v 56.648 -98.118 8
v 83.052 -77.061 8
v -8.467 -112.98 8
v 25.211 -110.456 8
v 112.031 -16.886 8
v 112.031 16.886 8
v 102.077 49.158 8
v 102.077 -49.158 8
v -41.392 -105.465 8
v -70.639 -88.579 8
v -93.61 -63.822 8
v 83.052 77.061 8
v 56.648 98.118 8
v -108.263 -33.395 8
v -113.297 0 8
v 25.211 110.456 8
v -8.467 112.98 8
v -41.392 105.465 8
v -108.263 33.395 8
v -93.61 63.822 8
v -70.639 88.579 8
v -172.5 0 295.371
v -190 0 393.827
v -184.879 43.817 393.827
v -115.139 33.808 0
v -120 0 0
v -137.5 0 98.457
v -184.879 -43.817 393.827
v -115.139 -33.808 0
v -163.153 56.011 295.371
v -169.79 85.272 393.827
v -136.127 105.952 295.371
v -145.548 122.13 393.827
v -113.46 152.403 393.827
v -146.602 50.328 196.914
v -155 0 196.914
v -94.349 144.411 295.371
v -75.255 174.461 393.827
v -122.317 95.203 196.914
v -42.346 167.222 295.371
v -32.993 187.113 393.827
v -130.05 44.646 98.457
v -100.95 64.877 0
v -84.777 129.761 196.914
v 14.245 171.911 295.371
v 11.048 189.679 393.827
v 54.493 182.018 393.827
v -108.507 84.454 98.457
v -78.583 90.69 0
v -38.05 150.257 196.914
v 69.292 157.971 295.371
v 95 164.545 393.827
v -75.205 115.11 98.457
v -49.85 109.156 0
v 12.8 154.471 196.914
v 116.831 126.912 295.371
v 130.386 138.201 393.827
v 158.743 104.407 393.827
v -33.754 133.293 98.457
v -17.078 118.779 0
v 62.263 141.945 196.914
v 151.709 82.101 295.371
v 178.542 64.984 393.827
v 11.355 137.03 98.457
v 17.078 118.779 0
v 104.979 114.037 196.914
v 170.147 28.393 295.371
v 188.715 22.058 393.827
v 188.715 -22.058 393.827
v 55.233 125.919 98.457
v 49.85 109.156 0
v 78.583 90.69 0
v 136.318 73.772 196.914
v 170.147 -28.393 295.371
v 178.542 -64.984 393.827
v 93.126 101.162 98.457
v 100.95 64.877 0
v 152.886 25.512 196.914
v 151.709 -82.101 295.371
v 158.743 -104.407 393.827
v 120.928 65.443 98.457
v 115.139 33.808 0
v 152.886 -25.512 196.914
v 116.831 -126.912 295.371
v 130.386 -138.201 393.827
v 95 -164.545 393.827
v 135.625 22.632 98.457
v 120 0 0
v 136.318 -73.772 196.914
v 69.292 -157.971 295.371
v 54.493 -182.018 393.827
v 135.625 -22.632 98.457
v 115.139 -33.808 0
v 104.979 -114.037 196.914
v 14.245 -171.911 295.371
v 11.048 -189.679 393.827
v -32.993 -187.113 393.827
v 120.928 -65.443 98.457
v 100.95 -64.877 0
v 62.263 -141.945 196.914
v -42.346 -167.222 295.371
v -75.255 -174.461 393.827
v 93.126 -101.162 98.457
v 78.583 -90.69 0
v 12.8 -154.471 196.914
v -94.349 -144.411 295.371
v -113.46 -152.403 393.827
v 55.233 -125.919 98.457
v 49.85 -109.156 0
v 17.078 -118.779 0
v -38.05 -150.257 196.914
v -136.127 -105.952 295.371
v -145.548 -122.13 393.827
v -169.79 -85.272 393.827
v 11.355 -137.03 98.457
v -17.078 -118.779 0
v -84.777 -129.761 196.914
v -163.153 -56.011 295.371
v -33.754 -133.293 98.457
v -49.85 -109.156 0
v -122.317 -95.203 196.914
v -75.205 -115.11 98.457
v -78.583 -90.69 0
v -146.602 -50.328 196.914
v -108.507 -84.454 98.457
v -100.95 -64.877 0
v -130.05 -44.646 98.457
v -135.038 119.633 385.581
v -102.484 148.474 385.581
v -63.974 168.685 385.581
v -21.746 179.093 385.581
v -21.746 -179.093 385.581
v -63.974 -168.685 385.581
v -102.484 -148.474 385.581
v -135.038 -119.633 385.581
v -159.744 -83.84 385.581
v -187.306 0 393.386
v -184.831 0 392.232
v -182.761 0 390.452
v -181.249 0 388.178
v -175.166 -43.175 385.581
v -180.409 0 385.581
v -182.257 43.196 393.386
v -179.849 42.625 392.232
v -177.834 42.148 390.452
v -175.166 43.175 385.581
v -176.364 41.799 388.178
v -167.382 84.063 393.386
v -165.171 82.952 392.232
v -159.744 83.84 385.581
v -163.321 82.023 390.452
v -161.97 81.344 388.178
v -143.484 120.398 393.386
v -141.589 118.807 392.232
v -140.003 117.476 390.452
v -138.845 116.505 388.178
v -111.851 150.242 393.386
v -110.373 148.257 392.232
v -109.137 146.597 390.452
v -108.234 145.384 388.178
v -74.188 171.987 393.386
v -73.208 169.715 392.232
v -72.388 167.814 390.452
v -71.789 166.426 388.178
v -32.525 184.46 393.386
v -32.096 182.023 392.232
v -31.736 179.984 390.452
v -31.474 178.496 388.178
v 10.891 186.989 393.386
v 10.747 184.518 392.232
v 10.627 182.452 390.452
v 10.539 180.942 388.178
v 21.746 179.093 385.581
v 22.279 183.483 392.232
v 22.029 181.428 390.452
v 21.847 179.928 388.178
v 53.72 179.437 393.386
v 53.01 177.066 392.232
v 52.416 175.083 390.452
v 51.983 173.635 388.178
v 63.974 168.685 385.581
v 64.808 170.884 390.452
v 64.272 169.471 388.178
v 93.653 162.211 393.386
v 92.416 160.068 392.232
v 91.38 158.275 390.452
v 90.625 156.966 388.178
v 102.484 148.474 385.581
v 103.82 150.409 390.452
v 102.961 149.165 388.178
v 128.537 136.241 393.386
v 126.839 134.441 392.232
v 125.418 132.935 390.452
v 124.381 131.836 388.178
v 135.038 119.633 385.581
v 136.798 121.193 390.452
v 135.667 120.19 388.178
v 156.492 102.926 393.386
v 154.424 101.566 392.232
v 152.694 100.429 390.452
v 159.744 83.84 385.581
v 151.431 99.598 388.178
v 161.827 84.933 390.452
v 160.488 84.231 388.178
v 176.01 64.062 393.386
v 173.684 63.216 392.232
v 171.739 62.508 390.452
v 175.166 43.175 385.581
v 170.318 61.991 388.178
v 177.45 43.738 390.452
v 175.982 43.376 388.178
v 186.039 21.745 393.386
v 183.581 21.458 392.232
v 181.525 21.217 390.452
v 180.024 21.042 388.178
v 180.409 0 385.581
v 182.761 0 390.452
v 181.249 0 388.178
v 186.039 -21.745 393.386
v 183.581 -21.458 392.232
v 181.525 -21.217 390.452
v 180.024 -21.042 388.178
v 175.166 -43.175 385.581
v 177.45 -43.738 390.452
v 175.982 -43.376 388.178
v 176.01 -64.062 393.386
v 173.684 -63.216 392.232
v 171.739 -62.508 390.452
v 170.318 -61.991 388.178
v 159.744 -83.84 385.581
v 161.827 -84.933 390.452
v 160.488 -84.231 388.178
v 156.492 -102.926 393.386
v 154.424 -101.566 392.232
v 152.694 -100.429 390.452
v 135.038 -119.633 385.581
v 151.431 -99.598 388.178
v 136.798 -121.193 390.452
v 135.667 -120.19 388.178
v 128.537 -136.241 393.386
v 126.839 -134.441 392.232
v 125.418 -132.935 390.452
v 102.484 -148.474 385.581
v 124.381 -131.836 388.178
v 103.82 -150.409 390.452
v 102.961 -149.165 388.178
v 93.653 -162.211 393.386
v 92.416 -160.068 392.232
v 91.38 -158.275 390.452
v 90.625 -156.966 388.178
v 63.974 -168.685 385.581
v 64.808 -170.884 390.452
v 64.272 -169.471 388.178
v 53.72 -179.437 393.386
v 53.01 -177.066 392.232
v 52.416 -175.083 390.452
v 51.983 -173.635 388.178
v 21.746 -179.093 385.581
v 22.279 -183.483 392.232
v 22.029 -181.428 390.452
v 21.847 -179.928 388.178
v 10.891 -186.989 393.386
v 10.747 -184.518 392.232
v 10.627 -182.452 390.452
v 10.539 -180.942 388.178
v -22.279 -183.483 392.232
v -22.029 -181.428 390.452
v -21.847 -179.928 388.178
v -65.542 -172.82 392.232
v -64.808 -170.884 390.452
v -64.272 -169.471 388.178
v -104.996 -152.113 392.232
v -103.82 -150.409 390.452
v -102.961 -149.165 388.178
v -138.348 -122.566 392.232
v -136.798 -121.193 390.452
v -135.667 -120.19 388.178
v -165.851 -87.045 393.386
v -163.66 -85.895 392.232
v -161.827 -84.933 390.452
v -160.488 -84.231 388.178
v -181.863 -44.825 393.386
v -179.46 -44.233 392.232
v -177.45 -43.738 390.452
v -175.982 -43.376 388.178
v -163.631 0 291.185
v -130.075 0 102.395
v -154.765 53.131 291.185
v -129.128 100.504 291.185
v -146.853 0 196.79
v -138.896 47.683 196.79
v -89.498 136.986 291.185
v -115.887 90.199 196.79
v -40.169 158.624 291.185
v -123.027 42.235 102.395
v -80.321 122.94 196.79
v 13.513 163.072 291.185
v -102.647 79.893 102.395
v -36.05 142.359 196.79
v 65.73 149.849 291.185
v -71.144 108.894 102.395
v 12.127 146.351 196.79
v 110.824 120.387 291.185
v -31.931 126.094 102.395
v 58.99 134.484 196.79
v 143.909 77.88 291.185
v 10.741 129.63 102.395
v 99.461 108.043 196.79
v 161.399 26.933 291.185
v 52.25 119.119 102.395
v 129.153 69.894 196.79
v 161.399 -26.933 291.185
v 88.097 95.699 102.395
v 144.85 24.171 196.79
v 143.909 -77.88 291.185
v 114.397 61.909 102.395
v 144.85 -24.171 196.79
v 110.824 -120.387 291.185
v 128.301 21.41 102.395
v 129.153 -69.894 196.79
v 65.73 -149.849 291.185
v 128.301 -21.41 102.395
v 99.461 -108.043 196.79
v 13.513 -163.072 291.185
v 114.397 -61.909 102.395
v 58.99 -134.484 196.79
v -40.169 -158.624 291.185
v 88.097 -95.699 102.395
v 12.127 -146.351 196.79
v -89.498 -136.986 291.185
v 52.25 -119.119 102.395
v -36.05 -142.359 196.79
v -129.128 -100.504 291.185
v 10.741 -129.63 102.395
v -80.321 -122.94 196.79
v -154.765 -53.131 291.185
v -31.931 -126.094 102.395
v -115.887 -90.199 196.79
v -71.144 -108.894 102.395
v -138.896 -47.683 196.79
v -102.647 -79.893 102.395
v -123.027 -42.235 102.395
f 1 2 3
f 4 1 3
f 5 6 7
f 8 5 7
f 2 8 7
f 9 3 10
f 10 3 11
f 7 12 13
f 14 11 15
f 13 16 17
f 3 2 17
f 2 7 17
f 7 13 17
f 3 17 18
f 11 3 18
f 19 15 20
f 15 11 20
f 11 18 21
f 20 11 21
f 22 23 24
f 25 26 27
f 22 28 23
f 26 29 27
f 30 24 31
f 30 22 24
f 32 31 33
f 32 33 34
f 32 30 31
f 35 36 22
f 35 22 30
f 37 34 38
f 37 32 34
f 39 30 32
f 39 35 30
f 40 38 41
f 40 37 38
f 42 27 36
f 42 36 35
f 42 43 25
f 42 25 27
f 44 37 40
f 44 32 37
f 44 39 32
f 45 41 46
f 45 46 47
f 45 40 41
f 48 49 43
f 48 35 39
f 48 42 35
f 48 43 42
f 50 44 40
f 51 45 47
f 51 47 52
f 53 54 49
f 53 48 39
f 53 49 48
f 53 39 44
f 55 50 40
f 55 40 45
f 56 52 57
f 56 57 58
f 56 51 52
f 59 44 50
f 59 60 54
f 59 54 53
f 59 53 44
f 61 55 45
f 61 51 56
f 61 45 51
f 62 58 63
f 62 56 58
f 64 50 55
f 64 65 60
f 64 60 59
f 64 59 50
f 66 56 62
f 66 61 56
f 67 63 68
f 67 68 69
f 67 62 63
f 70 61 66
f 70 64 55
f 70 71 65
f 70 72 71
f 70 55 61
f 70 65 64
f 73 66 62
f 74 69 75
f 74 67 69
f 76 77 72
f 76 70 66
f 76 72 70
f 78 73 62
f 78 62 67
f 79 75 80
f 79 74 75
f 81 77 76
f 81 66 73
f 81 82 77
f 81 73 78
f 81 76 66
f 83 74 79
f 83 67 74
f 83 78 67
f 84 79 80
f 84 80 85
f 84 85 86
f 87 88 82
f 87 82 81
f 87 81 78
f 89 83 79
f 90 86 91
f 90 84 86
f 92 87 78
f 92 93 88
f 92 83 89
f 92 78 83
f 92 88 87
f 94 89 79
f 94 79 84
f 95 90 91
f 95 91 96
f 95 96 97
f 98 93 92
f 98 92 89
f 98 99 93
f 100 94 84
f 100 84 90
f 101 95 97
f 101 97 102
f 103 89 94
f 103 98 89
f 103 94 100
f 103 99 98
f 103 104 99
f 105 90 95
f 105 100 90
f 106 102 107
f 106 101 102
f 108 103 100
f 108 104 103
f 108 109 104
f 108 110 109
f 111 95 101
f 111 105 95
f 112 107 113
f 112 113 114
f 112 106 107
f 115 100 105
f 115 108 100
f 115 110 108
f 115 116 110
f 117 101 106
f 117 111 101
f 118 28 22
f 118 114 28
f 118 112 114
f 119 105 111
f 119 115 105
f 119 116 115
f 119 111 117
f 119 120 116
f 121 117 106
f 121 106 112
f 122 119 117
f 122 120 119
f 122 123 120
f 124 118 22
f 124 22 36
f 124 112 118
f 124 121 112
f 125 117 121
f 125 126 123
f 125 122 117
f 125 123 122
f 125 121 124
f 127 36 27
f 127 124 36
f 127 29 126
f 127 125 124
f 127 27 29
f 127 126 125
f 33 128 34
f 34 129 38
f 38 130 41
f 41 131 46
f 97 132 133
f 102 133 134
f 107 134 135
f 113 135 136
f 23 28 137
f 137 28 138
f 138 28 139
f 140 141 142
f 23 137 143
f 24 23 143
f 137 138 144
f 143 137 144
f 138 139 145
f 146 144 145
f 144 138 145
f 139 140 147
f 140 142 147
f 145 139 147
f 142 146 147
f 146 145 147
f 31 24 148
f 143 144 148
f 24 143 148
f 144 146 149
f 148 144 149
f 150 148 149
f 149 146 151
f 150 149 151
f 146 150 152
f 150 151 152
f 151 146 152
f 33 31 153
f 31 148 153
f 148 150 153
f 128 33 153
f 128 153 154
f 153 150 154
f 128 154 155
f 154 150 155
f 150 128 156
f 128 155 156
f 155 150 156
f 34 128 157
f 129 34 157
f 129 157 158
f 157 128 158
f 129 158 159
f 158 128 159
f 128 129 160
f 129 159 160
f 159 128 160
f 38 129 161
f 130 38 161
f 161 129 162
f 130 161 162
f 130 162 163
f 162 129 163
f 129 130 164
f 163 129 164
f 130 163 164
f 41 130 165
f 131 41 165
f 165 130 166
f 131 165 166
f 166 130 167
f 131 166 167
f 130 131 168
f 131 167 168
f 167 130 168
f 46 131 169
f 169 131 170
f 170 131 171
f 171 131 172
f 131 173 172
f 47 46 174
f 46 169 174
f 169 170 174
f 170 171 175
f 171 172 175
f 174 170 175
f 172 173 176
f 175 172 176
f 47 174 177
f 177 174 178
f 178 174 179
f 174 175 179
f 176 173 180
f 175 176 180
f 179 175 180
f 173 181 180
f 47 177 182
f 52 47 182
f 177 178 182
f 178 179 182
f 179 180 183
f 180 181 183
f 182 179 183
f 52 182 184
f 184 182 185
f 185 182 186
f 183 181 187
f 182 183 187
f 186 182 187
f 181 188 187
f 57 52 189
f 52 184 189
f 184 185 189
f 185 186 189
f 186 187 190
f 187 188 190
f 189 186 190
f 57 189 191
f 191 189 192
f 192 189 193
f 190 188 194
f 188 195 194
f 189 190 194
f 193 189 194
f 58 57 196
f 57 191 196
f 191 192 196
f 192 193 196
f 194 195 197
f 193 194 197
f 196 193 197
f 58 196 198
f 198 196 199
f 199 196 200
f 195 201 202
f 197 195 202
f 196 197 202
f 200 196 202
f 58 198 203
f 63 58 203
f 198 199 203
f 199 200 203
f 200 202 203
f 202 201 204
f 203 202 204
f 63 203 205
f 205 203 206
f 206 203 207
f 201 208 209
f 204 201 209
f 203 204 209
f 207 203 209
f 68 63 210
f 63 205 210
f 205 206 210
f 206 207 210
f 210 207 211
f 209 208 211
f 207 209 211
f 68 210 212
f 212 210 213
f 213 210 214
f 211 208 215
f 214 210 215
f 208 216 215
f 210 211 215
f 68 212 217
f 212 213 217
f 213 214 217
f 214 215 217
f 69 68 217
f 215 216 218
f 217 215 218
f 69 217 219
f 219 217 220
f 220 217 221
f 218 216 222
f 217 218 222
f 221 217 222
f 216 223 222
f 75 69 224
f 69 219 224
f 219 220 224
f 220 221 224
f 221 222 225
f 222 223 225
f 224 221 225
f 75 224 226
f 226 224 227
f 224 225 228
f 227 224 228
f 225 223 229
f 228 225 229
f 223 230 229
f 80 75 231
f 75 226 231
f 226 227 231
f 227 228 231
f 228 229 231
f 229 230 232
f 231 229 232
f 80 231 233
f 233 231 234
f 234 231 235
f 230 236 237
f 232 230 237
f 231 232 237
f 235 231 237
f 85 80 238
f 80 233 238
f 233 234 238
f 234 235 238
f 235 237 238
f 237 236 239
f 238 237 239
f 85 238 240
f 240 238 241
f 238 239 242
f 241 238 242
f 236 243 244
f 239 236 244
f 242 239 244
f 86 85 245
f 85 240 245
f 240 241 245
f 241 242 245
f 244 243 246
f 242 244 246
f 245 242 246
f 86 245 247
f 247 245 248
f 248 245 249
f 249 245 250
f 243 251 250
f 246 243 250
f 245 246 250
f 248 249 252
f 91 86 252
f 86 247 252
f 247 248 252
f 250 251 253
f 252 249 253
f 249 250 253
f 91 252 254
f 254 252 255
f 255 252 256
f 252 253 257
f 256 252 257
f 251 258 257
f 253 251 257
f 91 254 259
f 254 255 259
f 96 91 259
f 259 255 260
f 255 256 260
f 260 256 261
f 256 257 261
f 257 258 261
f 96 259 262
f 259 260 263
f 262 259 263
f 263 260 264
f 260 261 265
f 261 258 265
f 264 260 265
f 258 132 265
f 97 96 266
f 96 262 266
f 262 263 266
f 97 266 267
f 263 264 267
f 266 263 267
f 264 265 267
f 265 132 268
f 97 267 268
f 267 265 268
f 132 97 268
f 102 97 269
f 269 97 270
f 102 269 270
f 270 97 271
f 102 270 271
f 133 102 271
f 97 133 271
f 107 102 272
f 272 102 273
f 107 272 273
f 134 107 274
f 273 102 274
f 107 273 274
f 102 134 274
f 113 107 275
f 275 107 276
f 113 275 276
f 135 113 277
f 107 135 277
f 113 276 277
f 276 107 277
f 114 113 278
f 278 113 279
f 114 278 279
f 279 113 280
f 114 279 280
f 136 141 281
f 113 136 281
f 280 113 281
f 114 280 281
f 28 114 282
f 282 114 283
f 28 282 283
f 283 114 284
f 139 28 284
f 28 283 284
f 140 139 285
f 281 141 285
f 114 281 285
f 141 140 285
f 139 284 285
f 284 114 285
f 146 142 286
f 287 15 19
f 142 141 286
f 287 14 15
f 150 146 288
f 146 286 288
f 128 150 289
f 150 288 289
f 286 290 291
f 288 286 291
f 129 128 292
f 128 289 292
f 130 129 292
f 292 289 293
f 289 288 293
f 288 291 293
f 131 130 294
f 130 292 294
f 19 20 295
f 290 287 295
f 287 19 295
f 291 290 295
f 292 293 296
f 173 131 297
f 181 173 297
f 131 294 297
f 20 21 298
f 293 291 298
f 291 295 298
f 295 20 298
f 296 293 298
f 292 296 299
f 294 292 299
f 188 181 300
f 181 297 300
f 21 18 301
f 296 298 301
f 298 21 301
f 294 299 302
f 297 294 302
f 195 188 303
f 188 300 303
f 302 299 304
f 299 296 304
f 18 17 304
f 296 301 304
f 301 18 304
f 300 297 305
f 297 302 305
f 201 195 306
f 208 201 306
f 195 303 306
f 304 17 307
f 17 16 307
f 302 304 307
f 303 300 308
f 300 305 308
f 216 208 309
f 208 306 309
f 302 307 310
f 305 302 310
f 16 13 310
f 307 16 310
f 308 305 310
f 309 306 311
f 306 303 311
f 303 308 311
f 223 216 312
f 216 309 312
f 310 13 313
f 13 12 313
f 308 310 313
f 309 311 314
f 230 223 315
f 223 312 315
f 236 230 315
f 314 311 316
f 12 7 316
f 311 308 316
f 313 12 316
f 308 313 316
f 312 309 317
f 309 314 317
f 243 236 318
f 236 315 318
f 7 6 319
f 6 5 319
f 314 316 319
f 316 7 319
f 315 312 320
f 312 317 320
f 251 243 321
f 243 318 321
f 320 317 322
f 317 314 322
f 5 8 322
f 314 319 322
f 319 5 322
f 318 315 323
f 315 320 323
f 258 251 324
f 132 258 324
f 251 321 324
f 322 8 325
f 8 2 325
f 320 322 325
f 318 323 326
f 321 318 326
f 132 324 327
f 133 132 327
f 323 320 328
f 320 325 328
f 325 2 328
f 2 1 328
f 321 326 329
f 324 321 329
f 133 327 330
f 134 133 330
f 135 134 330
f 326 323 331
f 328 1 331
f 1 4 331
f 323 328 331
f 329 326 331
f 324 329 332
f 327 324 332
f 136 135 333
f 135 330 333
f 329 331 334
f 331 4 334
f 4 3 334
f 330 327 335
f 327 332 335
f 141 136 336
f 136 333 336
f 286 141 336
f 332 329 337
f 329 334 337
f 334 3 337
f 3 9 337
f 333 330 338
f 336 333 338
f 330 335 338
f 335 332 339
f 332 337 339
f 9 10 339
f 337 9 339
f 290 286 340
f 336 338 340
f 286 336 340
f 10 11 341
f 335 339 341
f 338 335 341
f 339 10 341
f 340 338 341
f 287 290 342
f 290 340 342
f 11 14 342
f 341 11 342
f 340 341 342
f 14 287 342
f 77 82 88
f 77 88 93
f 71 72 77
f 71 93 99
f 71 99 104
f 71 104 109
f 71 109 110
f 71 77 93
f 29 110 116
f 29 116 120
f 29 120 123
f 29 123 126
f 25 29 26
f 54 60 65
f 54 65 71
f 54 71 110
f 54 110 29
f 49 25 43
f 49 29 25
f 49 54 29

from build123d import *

# Parameters (mm, degrees)
F2_T = -8


# Not quite as in the source:
# - a fillet or chamfer that OpenCascade refuses, or shapes differently, is made with other operations: its cross-section is extruded or revolved along the edge and cut away or added


with BuildPart() as f1:
    # F0 (on Front) → F1 (revolve)
    with BuildSketch(Plane.XZ):
        Polygon((-120, 0), (0, 0), (0, 393.8273733503), (-190, 393.8273733503), align=None)
    revolve(axis=Axis((0, 0, 196.9136866752), (0, 0, -1)))

    # F2
    f2_openings = [f1.faces().sort_by_distance(p)[0] for p in [
        (0, 0, 393.827373),
    ]]
    offset(amount=F2_T, openings=f2_openings)

    # F3: fillet of radius 10 on 1 edges, made by hand

    # F3_s1 → F3_t2 (revolve, cut)
    with BuildSketch(Plane.XZ):
        with BuildLine():
            ThreePointArc((-190, 393.8273733503), (-183.7348569365, 391.4131139305), (-180.408809713, 385.5806122358))
            Line((-180.408809713, 385.5806122358), (-181.8746125421, 393.8273733503))
            Line((-181.8746125421, 393.8273733503), (-190, 393.8273733503))
        make_face()
    revolve(axis=Axis((0, 0, 393.8273733503), (0, 0, -1)), mode=Mode.SUBTRACT)


solid = f1.part
